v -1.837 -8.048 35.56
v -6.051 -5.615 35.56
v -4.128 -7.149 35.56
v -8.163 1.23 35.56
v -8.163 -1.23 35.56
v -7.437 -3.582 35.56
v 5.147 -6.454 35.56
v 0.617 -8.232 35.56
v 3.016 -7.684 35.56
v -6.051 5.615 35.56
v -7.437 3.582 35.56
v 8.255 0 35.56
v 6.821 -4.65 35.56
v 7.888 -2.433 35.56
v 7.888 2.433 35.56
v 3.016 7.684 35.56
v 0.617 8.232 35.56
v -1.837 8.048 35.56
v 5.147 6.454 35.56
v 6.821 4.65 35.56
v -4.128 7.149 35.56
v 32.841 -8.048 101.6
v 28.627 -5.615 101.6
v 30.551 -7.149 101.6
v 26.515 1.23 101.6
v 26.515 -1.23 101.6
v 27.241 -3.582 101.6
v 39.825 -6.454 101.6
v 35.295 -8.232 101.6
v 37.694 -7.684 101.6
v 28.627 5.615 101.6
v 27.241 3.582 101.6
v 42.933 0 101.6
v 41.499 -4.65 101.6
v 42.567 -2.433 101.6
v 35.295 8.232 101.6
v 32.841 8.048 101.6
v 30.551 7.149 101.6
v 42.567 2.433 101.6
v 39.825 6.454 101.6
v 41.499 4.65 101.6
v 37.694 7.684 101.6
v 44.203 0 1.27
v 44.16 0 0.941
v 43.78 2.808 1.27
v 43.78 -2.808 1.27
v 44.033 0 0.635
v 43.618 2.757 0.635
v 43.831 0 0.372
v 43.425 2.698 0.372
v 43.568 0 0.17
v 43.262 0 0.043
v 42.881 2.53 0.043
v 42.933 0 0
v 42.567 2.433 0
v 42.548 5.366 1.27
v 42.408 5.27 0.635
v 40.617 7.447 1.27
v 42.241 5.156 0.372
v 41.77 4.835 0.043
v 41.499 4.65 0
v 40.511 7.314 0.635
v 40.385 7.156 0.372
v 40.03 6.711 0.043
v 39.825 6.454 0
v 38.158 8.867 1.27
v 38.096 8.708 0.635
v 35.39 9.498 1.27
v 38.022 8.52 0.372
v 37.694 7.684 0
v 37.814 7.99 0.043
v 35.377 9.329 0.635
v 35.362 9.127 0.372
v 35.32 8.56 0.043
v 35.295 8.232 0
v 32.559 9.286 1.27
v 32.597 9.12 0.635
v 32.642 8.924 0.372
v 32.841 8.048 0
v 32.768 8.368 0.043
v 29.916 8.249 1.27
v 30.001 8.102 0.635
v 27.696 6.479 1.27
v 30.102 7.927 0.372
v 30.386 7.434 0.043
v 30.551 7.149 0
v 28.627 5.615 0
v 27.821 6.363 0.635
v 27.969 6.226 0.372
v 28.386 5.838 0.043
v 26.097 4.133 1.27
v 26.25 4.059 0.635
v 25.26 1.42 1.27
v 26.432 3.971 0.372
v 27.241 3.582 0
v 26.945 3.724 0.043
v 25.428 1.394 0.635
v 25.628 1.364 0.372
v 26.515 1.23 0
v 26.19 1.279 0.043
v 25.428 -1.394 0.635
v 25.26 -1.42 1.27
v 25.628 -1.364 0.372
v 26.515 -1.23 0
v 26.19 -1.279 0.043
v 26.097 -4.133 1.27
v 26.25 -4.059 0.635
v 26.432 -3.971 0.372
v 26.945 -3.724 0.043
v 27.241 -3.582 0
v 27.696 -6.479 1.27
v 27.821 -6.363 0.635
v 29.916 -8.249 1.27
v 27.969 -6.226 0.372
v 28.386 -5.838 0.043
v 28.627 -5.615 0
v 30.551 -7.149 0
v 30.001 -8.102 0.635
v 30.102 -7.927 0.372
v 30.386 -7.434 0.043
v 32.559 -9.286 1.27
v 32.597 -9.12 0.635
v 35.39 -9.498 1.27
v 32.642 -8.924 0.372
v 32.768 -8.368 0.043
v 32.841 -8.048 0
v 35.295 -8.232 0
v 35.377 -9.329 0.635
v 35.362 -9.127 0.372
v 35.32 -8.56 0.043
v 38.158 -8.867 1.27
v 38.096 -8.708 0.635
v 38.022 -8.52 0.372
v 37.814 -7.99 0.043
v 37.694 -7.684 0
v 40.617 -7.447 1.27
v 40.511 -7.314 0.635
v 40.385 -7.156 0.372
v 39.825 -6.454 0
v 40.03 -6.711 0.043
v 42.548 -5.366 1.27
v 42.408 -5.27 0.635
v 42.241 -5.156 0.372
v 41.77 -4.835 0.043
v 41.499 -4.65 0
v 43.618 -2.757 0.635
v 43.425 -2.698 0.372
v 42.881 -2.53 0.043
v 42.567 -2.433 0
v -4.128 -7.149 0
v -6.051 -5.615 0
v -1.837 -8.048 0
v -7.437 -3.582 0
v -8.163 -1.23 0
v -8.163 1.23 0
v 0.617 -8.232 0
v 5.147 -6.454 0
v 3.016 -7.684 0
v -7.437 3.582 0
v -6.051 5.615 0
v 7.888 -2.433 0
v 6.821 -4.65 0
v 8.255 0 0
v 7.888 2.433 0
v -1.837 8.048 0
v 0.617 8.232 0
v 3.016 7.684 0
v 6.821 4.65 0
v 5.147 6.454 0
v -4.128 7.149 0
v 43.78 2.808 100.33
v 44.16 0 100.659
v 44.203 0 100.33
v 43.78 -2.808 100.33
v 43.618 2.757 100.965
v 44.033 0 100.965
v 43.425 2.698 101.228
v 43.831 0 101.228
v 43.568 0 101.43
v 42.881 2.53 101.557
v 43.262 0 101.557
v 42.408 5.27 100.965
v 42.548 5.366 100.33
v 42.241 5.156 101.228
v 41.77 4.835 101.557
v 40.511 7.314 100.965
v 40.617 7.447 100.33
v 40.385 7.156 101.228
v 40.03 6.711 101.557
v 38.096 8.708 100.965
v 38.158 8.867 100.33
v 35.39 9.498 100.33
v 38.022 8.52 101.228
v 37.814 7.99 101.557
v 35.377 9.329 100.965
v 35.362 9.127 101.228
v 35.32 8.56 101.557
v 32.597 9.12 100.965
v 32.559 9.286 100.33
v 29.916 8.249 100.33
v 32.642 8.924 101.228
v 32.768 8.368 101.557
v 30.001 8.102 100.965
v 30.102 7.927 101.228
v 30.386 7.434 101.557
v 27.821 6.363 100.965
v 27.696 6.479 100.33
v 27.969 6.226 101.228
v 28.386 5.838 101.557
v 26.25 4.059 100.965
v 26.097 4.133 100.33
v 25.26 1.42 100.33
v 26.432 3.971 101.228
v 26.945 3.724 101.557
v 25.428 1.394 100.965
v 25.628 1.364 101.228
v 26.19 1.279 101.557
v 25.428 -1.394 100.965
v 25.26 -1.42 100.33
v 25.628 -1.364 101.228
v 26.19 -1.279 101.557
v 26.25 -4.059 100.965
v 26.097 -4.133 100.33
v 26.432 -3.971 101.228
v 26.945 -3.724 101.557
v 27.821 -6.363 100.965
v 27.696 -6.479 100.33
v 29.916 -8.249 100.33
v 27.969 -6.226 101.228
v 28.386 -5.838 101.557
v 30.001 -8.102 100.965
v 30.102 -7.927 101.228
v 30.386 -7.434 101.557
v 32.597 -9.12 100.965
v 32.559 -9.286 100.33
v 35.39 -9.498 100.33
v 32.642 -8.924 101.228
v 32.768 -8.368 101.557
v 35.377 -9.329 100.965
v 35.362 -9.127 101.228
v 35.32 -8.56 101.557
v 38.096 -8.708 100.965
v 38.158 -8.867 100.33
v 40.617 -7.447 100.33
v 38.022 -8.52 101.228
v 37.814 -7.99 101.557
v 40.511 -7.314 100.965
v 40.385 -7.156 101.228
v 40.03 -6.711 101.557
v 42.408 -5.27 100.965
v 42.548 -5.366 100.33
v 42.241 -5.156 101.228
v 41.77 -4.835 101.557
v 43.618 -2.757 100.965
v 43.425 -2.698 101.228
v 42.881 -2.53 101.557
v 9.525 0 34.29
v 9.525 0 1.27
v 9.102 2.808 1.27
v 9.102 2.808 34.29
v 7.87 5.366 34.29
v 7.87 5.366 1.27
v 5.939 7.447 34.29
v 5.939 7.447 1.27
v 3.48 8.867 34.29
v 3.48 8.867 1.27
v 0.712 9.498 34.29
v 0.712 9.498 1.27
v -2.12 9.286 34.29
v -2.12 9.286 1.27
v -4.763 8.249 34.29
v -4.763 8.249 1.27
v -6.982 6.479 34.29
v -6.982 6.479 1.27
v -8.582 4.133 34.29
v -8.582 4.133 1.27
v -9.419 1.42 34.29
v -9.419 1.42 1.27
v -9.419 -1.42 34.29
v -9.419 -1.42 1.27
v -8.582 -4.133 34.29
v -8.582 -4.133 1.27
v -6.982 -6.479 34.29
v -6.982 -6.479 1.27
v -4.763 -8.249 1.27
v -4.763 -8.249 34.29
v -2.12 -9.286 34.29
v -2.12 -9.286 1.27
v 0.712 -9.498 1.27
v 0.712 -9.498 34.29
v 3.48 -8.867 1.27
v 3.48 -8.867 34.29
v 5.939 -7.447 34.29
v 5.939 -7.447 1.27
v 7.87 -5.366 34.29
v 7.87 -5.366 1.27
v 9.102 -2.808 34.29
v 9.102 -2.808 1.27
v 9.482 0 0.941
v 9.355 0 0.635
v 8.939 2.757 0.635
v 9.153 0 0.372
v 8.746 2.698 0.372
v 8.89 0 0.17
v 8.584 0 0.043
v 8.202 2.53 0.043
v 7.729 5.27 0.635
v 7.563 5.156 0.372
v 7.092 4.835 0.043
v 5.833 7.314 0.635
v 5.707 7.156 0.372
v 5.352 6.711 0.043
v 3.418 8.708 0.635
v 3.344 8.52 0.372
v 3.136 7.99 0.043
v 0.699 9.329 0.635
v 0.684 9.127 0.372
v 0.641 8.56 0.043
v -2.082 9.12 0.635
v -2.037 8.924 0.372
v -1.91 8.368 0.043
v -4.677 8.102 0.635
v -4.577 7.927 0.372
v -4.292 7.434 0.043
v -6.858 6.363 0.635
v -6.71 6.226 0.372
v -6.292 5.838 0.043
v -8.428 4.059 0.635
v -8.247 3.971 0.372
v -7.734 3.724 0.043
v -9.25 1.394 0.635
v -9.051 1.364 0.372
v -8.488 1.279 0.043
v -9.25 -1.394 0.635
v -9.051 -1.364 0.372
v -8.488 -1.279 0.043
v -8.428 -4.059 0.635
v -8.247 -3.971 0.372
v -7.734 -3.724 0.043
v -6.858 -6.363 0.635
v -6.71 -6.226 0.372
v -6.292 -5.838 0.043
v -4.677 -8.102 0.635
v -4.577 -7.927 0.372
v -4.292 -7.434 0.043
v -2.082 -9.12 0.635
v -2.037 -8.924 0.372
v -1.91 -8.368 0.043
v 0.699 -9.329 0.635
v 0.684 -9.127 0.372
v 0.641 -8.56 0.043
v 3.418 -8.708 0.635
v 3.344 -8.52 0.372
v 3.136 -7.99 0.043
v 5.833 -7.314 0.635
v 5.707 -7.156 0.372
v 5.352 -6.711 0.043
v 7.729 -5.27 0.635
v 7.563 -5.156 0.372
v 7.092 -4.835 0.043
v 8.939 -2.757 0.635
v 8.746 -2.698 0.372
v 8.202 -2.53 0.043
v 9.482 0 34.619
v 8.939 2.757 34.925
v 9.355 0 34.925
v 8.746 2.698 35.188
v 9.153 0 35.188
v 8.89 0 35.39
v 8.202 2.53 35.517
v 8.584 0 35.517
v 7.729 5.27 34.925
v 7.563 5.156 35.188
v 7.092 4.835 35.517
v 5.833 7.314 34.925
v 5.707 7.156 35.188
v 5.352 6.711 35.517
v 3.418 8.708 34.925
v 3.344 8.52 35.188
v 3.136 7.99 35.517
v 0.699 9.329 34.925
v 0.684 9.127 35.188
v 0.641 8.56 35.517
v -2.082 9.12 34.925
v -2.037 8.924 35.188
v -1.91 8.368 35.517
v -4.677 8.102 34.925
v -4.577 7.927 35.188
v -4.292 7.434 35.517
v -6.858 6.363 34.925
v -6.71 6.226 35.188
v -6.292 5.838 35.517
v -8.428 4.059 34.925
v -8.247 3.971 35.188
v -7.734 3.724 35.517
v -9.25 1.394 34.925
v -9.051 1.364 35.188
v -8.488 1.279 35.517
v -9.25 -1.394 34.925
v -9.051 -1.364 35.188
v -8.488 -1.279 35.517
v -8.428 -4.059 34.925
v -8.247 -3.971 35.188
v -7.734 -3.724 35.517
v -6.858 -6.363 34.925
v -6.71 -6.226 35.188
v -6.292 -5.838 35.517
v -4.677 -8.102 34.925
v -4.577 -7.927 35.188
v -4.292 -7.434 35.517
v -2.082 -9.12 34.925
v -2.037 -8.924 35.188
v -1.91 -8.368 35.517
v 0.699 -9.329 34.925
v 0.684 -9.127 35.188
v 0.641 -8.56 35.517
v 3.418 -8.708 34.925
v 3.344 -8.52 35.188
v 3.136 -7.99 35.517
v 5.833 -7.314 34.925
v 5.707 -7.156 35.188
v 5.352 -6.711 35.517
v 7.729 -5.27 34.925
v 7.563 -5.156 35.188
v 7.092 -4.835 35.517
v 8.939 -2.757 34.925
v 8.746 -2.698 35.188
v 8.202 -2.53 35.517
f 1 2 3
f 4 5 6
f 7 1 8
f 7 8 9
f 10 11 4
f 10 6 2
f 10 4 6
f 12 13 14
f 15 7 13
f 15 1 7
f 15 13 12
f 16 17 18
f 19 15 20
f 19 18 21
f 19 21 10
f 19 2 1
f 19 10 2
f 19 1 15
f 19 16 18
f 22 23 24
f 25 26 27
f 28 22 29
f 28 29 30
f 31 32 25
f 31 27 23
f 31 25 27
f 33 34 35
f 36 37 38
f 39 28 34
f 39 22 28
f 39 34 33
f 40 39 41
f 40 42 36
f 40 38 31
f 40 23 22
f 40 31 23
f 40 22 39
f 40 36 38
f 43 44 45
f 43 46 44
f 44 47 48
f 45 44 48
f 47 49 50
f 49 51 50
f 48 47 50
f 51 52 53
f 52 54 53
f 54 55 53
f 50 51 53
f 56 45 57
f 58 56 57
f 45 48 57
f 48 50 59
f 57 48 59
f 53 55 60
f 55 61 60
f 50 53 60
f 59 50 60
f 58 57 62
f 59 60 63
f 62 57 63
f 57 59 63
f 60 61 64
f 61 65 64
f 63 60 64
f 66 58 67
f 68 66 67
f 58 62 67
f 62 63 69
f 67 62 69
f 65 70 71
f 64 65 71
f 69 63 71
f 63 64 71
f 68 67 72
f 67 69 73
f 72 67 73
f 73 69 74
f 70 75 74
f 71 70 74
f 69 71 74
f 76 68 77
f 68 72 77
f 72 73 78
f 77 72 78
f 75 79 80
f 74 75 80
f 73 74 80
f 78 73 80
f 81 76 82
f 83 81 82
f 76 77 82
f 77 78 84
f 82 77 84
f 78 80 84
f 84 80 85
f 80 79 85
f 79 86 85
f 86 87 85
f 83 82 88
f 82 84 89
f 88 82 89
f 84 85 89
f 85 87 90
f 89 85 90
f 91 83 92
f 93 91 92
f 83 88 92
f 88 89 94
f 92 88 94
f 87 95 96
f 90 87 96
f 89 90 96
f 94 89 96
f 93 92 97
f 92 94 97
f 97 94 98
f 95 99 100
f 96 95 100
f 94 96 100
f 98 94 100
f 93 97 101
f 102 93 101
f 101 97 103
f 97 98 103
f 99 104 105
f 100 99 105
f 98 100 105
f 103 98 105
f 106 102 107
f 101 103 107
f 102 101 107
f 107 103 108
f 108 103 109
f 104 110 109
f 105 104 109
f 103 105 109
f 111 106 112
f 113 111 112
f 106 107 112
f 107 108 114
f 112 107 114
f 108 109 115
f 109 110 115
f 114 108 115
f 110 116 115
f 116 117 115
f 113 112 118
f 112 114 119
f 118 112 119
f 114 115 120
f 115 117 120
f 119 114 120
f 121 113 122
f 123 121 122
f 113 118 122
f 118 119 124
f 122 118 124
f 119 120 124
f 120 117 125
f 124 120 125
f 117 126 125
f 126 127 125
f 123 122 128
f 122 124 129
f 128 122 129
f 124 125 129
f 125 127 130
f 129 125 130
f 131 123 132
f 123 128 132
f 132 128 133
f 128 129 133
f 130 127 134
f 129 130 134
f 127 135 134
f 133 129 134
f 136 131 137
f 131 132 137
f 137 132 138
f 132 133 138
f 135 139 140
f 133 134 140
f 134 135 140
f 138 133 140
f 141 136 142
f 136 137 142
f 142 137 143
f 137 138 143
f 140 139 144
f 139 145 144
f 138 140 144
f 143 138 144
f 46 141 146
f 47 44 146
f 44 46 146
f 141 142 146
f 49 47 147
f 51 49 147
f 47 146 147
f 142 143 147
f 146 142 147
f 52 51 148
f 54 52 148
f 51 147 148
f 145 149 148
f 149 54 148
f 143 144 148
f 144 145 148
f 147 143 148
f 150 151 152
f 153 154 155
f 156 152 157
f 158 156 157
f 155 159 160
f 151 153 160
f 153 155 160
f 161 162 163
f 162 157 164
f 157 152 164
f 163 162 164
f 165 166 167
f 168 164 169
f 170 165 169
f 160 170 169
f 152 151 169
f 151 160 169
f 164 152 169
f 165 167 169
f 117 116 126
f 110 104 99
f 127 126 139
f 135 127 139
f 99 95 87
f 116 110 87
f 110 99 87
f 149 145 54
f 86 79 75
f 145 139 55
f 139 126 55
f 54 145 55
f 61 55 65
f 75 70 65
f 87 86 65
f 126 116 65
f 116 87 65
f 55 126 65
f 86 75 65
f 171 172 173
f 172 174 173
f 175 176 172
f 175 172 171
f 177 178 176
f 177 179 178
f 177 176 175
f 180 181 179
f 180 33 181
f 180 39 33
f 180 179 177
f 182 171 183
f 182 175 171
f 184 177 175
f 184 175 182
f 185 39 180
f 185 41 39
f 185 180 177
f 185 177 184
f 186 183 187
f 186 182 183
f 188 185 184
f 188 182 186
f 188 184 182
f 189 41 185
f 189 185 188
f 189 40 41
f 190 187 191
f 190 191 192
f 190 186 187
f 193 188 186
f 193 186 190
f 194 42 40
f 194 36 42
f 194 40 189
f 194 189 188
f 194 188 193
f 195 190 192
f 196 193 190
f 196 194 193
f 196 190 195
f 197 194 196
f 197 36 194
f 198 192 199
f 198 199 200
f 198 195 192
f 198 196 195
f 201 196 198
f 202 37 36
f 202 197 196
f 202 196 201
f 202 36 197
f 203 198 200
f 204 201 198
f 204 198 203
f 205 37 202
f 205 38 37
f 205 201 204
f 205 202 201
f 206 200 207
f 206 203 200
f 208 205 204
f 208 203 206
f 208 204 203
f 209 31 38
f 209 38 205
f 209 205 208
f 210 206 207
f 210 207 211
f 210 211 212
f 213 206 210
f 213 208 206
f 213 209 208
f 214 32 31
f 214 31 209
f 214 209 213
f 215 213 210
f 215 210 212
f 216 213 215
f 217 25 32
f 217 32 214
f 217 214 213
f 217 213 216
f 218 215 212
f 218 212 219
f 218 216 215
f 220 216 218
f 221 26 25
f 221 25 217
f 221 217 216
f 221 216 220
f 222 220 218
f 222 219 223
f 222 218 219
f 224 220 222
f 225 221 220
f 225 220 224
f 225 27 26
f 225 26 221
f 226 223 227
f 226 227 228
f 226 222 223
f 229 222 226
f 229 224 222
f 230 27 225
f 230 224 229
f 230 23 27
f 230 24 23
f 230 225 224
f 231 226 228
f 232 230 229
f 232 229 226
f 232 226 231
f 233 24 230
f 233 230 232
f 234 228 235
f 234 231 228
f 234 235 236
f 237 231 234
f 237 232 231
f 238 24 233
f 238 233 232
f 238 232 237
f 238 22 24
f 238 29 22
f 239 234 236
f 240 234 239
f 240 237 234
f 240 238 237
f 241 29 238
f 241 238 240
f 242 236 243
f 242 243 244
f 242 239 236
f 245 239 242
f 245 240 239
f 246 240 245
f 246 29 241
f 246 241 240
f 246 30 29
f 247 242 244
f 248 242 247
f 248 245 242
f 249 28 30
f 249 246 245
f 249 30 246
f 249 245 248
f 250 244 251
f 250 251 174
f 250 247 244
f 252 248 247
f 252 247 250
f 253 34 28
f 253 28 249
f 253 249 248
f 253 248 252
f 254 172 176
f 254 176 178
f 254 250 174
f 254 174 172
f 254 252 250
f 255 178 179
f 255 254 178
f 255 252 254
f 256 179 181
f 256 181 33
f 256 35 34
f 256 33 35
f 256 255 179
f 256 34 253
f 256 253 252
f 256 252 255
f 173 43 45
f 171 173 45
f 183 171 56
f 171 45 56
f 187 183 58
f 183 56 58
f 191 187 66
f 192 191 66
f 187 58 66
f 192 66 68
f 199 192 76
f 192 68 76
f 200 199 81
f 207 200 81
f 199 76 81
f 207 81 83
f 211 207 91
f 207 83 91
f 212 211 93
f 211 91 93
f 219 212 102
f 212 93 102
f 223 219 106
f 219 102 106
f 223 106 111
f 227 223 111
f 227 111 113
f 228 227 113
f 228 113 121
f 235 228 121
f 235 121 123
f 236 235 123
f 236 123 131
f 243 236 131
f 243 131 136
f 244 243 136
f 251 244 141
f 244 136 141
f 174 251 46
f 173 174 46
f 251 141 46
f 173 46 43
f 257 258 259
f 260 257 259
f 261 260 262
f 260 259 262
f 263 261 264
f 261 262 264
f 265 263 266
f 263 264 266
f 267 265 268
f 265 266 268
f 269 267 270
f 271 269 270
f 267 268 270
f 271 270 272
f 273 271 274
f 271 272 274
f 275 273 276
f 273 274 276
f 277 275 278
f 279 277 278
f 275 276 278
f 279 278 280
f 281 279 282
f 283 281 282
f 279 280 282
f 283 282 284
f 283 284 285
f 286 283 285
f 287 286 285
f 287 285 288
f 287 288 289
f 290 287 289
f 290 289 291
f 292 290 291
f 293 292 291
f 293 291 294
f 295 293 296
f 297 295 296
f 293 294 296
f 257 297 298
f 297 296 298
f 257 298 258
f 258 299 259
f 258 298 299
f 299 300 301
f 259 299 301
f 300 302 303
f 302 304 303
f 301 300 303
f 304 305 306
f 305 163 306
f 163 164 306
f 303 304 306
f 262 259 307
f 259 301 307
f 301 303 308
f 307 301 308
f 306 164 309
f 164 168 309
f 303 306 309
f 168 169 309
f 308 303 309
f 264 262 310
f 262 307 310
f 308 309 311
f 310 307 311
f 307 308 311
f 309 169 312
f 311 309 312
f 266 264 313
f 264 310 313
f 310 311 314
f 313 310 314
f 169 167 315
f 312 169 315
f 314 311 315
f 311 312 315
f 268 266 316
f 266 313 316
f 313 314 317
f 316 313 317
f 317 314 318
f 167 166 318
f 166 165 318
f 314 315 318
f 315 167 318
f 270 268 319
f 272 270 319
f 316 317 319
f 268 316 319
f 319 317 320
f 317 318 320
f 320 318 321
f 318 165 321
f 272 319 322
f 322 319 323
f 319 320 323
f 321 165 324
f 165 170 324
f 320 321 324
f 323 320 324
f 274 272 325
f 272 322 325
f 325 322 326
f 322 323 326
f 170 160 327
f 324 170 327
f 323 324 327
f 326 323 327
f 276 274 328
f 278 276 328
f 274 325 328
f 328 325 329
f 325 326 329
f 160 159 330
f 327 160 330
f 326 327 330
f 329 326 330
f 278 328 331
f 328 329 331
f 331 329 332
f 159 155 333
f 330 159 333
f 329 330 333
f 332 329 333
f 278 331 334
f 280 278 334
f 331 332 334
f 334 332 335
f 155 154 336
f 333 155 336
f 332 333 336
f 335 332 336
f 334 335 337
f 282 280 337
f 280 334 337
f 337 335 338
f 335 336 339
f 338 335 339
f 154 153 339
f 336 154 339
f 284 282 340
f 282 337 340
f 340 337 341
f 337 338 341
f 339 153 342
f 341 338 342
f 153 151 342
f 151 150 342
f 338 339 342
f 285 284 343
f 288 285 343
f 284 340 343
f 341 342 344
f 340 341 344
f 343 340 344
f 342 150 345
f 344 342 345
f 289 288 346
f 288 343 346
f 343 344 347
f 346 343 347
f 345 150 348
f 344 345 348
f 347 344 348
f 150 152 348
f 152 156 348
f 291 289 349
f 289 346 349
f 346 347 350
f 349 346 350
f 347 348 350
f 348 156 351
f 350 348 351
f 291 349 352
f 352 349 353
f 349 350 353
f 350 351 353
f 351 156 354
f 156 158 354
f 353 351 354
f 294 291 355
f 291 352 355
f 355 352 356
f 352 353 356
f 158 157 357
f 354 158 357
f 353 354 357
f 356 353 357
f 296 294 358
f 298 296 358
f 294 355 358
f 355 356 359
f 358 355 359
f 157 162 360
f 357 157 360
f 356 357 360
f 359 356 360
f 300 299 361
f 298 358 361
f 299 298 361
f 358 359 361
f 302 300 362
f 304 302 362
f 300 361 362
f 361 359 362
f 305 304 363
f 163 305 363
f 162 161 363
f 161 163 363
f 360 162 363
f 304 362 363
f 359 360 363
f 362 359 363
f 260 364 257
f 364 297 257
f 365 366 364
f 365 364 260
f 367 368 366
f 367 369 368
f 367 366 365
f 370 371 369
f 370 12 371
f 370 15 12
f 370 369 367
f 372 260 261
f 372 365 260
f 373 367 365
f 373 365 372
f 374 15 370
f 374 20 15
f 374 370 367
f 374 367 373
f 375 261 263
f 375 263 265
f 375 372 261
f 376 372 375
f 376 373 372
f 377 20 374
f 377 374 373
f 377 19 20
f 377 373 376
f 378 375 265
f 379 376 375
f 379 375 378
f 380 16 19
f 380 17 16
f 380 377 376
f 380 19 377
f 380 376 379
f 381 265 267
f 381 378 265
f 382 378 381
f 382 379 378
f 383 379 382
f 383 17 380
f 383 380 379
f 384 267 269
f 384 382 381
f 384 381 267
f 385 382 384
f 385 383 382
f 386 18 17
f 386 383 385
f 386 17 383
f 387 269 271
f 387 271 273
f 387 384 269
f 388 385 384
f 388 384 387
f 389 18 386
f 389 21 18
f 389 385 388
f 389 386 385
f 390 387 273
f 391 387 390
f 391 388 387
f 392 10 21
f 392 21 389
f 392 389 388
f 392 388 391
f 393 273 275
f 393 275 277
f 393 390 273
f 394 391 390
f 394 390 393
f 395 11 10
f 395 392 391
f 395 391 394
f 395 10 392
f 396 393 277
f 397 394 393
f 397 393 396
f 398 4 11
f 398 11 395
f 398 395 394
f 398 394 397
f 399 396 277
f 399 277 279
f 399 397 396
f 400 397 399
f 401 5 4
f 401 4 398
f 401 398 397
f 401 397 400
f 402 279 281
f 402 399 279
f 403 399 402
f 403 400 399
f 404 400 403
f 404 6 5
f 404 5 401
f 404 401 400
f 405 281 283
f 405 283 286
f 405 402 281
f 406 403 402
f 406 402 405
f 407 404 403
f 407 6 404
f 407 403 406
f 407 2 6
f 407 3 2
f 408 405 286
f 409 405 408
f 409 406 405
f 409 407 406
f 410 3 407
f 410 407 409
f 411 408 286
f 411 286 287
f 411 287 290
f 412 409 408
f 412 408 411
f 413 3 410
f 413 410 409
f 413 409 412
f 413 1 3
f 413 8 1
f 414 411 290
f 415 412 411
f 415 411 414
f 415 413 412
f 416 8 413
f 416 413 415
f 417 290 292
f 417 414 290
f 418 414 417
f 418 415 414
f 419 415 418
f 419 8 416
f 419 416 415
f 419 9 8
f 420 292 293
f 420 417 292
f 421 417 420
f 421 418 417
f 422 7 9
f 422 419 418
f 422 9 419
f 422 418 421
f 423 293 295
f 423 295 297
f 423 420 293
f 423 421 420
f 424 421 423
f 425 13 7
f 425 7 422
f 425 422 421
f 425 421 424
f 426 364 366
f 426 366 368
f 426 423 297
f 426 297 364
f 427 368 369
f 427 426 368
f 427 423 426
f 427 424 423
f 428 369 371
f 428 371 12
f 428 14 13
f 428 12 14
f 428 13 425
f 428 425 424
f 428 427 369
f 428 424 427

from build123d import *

# Parameters (mm, degrees)
F0_R     = 9.525
F1_DEPTH = 35.56
F2_R     = 1.27
F3_R     = 9.525
F4_DEPTH = 101.6
F5_R     = 1.27


with BuildPart() as f1:
    # F0 (on Top) → F1 (new body)
    with BuildSketch(Plane.XY):
        Circle(F0_R)
    extrude(amount=F1_DEPTH)

    # F2
    f2_edges = [f1.edges().sort_by_distance(p)[0] for p in [
        (-9.525, 0, 35.56),
        (-9.525, 0, 0),
    ]]
    fillet(f2_edges, radius=F2_R)


with BuildPart() as f4:
    # F3 (on Top) → F4 (new body)
    with BuildSketch(Plane.XY):
        with Locations((34.678298, 0)):
            Circle(F3_R)
    extrude(amount=F4_DEPTH)

    # F5
    f5_edges = [f4.edges().sort_by_distance(p)[0] for p in [
        (25.153298, 0, 101.6),
        (25.153298, 0, 0),
    ]]
    fillet(f5_edges, radius=F5_R)


solid = Compound([f1.part, f4.part])
